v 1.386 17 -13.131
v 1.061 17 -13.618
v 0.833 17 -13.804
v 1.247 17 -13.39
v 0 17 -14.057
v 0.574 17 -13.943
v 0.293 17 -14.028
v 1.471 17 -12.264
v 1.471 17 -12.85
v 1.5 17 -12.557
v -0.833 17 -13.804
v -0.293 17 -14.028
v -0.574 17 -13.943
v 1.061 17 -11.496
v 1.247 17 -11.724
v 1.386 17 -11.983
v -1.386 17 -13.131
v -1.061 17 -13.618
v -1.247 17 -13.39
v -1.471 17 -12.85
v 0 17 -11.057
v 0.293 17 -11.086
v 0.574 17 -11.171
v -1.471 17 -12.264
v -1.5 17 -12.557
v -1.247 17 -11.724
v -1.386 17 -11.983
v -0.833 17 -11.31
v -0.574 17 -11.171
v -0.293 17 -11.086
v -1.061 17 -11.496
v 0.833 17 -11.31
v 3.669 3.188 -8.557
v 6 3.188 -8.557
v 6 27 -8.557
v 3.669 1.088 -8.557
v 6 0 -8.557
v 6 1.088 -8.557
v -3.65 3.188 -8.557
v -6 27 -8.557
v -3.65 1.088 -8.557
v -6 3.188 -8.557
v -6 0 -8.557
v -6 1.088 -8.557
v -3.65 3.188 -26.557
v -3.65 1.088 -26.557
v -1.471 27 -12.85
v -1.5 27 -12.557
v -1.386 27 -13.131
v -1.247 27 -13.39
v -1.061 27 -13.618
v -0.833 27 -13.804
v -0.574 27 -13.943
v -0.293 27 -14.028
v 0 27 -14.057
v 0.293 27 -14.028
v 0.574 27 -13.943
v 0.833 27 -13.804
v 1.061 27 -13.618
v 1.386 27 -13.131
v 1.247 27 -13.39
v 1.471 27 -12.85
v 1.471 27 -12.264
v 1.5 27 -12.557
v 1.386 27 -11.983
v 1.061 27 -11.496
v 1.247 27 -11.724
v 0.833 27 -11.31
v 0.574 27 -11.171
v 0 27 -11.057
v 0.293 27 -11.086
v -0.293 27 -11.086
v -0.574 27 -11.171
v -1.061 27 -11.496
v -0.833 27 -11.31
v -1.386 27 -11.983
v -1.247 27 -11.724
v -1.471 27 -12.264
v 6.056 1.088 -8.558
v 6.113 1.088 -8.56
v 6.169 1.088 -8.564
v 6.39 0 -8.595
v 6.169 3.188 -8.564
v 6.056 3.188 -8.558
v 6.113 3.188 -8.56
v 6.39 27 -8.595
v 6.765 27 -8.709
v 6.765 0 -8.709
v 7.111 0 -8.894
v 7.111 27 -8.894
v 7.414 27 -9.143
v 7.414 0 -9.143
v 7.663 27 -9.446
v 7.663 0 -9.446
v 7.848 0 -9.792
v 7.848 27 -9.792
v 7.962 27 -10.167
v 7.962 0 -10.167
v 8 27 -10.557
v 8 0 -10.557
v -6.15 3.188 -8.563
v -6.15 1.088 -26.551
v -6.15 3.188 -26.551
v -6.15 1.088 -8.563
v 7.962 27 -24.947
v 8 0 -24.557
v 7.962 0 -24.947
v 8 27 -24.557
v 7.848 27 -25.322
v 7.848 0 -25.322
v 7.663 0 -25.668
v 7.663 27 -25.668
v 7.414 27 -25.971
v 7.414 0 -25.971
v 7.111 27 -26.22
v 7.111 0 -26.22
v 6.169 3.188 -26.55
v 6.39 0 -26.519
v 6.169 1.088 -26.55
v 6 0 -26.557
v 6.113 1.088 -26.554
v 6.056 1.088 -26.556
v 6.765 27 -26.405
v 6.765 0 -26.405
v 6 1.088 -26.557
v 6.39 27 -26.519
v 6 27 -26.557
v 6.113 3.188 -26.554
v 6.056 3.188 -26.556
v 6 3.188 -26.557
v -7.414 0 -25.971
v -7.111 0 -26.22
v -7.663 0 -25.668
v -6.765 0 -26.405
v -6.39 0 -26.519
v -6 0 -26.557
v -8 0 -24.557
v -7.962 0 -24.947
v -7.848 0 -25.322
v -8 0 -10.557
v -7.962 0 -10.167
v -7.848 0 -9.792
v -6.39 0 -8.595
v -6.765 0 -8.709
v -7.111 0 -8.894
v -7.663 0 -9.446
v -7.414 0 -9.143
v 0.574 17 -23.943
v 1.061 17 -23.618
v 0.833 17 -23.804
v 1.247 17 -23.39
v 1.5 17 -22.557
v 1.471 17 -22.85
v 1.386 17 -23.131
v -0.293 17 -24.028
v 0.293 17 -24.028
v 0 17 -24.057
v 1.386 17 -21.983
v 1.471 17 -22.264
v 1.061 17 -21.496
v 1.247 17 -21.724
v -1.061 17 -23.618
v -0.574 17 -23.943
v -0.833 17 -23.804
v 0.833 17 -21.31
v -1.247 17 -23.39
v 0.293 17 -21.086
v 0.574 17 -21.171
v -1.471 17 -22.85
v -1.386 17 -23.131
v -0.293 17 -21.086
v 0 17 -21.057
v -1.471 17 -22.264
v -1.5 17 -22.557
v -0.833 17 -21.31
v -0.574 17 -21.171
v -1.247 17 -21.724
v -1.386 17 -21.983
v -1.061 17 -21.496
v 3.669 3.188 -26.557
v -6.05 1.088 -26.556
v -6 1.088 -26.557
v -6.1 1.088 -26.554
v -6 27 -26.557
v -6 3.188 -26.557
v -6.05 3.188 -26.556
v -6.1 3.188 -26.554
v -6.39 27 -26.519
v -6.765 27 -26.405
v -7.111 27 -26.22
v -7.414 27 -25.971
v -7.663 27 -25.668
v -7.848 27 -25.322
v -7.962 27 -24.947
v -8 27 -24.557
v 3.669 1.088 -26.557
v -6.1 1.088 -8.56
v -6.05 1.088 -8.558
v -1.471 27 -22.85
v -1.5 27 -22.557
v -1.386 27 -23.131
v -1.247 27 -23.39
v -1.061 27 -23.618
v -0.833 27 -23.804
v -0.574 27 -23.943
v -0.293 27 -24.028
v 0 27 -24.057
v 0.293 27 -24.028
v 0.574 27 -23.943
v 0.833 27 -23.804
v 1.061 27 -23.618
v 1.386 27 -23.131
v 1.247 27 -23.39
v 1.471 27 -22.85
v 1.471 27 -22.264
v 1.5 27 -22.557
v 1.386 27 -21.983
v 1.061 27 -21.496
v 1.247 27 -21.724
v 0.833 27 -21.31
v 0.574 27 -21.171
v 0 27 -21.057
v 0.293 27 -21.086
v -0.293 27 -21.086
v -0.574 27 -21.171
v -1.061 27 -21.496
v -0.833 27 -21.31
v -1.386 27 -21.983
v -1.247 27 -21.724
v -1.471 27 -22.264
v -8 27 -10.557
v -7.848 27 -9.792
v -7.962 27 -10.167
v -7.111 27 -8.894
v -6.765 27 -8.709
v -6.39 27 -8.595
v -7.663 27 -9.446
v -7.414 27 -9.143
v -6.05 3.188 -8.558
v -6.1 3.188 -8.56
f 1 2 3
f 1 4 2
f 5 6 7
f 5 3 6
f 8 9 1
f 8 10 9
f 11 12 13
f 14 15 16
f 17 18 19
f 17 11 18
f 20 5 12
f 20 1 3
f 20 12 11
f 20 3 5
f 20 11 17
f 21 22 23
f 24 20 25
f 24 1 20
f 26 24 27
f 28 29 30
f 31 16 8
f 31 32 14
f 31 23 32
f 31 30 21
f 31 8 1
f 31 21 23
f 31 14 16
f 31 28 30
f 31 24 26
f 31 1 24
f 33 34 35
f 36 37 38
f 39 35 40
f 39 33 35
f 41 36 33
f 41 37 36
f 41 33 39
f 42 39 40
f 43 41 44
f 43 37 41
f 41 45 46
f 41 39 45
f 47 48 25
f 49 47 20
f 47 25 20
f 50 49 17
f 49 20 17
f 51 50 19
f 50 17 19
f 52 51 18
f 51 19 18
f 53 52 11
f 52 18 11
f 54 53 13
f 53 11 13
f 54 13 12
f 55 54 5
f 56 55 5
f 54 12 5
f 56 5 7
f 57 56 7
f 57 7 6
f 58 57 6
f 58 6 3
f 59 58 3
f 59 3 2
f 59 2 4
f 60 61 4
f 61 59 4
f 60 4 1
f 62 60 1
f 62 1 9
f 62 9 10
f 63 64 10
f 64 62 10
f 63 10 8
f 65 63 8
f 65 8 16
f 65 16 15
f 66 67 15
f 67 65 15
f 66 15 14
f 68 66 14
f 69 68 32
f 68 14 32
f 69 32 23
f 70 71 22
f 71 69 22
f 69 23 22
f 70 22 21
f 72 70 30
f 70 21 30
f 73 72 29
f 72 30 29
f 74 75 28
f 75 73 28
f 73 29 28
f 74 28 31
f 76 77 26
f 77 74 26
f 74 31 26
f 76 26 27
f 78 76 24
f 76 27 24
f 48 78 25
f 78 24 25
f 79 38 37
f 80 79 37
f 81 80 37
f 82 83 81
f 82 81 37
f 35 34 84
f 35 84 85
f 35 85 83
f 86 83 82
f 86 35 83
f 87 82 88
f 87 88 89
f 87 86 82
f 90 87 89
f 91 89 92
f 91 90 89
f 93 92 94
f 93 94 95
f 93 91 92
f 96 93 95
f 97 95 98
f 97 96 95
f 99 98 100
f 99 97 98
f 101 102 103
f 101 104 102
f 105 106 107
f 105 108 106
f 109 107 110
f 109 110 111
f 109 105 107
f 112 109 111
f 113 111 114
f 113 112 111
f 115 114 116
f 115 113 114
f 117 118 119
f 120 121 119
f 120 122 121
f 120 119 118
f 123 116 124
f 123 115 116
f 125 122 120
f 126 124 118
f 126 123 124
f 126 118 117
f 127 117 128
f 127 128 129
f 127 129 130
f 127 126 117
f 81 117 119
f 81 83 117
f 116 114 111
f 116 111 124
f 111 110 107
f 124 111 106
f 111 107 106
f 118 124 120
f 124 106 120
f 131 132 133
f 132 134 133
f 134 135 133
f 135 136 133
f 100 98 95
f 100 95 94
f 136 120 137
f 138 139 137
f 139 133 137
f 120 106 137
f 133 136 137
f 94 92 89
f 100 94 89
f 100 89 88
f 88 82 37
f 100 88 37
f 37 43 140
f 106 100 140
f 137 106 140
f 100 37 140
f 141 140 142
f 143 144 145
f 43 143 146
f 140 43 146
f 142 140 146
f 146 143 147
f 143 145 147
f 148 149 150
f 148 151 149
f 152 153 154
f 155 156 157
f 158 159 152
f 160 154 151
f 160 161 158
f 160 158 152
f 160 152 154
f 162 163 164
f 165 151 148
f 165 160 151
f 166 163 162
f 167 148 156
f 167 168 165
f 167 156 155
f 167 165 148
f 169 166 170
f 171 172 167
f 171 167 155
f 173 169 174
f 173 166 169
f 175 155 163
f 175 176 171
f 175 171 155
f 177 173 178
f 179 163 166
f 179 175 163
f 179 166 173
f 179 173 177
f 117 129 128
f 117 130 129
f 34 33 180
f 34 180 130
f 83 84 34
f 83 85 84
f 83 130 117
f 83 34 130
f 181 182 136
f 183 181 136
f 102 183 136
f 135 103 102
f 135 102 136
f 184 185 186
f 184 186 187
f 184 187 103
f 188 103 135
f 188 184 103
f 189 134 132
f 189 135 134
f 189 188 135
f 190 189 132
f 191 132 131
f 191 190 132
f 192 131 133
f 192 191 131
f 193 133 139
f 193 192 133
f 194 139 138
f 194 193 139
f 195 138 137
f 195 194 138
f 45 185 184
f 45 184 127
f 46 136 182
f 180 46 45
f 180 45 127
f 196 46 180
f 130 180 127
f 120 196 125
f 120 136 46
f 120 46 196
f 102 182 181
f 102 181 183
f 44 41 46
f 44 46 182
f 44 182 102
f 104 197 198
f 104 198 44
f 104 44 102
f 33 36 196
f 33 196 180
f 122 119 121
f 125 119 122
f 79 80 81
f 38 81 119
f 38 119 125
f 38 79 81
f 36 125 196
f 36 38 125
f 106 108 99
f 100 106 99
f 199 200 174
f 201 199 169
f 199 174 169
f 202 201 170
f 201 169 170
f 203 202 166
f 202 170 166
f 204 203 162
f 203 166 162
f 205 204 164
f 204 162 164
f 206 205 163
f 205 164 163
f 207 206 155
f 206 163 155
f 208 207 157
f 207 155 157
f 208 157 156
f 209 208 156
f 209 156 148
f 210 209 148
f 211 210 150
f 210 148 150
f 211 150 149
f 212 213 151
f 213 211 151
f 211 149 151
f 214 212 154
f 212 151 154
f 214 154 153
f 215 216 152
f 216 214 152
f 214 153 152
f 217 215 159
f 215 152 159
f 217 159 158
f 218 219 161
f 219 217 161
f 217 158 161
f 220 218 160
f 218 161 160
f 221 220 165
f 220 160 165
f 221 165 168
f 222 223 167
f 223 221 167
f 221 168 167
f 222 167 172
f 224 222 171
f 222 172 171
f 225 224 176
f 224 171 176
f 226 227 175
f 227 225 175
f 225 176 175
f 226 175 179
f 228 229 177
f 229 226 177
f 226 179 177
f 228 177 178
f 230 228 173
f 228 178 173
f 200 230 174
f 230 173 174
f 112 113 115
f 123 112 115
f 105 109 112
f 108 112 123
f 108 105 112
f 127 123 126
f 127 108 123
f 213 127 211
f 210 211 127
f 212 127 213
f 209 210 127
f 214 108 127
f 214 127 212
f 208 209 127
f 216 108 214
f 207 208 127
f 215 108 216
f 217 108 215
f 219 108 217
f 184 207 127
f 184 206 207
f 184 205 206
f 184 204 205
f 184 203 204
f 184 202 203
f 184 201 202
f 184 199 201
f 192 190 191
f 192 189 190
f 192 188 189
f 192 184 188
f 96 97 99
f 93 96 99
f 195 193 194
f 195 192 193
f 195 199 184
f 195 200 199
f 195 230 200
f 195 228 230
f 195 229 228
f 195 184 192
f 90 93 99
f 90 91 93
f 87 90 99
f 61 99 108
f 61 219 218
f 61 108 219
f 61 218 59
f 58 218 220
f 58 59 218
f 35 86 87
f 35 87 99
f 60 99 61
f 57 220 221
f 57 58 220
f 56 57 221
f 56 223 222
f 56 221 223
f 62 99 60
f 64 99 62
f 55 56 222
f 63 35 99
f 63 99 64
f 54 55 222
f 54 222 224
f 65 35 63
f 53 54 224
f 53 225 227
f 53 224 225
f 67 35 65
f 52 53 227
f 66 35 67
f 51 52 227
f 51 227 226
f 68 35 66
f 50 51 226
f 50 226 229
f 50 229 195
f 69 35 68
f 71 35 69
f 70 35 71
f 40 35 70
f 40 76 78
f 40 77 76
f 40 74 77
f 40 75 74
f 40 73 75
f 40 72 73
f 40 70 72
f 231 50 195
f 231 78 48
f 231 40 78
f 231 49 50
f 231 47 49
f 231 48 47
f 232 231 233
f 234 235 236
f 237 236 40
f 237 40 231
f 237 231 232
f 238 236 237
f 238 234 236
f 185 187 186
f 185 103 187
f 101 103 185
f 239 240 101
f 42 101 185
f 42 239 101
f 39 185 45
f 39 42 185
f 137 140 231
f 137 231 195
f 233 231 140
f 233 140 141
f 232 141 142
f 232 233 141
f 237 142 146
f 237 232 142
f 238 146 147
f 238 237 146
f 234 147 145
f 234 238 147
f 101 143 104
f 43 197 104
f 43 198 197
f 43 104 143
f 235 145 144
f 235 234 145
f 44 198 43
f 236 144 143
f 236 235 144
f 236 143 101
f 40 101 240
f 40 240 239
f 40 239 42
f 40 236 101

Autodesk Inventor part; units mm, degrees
ref_plane "YZ Plane" through (0, 0, 0) normal (1, 0, 0) x (0, 1, 0)
ref_plane "XZ Plane" through (0, 0, 0) normal (0, 1, 0) x (-1, 0, 0)
ref_plane "XY Plane" through (0, 0, 0) normal (0, 0, 1) x (1, 0, 0)
sketch "Sketch1" plane through (0, 0, 0) normal (0, 1, 0) x (-1, 0, 0)
  circle A0 centre (0, -12.557) radius 1.5
  circle A1 centre (0, -22.557) radius 1.5
  arc A2 (-14.605, -9.6379) -> (-15.8103, -6.9952) centre (-18.105, -9.6379) ccw
  line L0 (-14.605, -29.4809) -> (-14.605, -9.6379)
  line L1 (13.605, -29.4809) -> (-14.605, -29.4809)
  line L2 (13.605, -12.0588) -> (13.605, -29.4809)
  arc A3 (14.5665, -9.2788) -> (13.605, -12.0588) centre (18.105, -12.0588) ccw
  line L3 (0, -22.557) -> (0, -12.557)
  line L4 (-8, -8.557) -> (8, -8.557)
  line L5 (8, -8.557) -> (8, -26.557)
  line L6 (8, -26.557) -> (-8, -26.557)
  line L7 (-8, -26.557) -> (-8, -8.557)
  line L8 (-8, -8.557) -> (8, -26.557) construction
  line L9 (8, -8.557) -> (-8, -26.557) construction
  point P0 (0, -17.557)
  dimension "d0" = 3
  dimension "d1" = 3
  dimension "d2" = 10
  dimension "d3" = 16
  dimension "d4" = 18
extrude "Extrusion1" add sketch "Sketch1" along normal blind 27
extrude "Extrusion2" add sketch "Sketch1" along normal blind 17 contours A0 | A1
fillet "Fillet1" radius 2 4 edges at (-8, 13.5, -8.557) (8, 13.5, -8.557) (-8, 13.5, -26.557) (8, 13.5, -26.557)
sketch "Sketch2" plane through (-6, 0, -8.557) normal (0, 0, 1) x (1, 0, 0)
  line L0 (-0.15, 3.1878) -> (2.35, 3.1878)
  line L1 (2.35, 3.1878) -> (2.35, 1.0878)
  line L2 (2.35, 1.0878) -> (-0.15, 1.0878)
  line L3 (-0.15, 1.0878) -> (-0.15, 3.1878)
  line L4 (-0.15, 3.1878) -> (2.35, 1.0878) construction
  line L5 (2.35, 3.1878) -> (-0.15, 1.0878) construction
  line L6 (9.6689, 3.1878) -> (12.1689, 3.1878)
  line L7 (12.1689, 3.1878) -> (12.1689, 1.0878)
  line L8 (12.1689, 1.0878) -> (9.6689, 1.0878)
  line L9 (9.6689, 1.0878) -> (9.6689, 3.1878)
  line L10 (9.6689, 3.1878) -> (12.1689, 1.0878) construction
  line L11 (12.1689, 3.1878) -> (9.6689, 1.0878) construction
  line L12 (-0.15, 2.1378) -> (12.15, 2.1378) construction
  line L13 (6, 0) -> (6, 2.1378)
  point P0 (1.1, 2.1378)
  point P1 (10.9189, 2.1378)
  point P2 (12.1689, 2.1378)
  dimension "d10" = 2.5
  dimension "d11" = 2.1
  dimension "d12" = 2.5
  dimension "d13" = 2.1
  dimension "d14" = 12.3
extrude "Extrusion3" cut sketch "Sketch2" against normal blind 19.5
properties part number "IR Headtracker riser"
